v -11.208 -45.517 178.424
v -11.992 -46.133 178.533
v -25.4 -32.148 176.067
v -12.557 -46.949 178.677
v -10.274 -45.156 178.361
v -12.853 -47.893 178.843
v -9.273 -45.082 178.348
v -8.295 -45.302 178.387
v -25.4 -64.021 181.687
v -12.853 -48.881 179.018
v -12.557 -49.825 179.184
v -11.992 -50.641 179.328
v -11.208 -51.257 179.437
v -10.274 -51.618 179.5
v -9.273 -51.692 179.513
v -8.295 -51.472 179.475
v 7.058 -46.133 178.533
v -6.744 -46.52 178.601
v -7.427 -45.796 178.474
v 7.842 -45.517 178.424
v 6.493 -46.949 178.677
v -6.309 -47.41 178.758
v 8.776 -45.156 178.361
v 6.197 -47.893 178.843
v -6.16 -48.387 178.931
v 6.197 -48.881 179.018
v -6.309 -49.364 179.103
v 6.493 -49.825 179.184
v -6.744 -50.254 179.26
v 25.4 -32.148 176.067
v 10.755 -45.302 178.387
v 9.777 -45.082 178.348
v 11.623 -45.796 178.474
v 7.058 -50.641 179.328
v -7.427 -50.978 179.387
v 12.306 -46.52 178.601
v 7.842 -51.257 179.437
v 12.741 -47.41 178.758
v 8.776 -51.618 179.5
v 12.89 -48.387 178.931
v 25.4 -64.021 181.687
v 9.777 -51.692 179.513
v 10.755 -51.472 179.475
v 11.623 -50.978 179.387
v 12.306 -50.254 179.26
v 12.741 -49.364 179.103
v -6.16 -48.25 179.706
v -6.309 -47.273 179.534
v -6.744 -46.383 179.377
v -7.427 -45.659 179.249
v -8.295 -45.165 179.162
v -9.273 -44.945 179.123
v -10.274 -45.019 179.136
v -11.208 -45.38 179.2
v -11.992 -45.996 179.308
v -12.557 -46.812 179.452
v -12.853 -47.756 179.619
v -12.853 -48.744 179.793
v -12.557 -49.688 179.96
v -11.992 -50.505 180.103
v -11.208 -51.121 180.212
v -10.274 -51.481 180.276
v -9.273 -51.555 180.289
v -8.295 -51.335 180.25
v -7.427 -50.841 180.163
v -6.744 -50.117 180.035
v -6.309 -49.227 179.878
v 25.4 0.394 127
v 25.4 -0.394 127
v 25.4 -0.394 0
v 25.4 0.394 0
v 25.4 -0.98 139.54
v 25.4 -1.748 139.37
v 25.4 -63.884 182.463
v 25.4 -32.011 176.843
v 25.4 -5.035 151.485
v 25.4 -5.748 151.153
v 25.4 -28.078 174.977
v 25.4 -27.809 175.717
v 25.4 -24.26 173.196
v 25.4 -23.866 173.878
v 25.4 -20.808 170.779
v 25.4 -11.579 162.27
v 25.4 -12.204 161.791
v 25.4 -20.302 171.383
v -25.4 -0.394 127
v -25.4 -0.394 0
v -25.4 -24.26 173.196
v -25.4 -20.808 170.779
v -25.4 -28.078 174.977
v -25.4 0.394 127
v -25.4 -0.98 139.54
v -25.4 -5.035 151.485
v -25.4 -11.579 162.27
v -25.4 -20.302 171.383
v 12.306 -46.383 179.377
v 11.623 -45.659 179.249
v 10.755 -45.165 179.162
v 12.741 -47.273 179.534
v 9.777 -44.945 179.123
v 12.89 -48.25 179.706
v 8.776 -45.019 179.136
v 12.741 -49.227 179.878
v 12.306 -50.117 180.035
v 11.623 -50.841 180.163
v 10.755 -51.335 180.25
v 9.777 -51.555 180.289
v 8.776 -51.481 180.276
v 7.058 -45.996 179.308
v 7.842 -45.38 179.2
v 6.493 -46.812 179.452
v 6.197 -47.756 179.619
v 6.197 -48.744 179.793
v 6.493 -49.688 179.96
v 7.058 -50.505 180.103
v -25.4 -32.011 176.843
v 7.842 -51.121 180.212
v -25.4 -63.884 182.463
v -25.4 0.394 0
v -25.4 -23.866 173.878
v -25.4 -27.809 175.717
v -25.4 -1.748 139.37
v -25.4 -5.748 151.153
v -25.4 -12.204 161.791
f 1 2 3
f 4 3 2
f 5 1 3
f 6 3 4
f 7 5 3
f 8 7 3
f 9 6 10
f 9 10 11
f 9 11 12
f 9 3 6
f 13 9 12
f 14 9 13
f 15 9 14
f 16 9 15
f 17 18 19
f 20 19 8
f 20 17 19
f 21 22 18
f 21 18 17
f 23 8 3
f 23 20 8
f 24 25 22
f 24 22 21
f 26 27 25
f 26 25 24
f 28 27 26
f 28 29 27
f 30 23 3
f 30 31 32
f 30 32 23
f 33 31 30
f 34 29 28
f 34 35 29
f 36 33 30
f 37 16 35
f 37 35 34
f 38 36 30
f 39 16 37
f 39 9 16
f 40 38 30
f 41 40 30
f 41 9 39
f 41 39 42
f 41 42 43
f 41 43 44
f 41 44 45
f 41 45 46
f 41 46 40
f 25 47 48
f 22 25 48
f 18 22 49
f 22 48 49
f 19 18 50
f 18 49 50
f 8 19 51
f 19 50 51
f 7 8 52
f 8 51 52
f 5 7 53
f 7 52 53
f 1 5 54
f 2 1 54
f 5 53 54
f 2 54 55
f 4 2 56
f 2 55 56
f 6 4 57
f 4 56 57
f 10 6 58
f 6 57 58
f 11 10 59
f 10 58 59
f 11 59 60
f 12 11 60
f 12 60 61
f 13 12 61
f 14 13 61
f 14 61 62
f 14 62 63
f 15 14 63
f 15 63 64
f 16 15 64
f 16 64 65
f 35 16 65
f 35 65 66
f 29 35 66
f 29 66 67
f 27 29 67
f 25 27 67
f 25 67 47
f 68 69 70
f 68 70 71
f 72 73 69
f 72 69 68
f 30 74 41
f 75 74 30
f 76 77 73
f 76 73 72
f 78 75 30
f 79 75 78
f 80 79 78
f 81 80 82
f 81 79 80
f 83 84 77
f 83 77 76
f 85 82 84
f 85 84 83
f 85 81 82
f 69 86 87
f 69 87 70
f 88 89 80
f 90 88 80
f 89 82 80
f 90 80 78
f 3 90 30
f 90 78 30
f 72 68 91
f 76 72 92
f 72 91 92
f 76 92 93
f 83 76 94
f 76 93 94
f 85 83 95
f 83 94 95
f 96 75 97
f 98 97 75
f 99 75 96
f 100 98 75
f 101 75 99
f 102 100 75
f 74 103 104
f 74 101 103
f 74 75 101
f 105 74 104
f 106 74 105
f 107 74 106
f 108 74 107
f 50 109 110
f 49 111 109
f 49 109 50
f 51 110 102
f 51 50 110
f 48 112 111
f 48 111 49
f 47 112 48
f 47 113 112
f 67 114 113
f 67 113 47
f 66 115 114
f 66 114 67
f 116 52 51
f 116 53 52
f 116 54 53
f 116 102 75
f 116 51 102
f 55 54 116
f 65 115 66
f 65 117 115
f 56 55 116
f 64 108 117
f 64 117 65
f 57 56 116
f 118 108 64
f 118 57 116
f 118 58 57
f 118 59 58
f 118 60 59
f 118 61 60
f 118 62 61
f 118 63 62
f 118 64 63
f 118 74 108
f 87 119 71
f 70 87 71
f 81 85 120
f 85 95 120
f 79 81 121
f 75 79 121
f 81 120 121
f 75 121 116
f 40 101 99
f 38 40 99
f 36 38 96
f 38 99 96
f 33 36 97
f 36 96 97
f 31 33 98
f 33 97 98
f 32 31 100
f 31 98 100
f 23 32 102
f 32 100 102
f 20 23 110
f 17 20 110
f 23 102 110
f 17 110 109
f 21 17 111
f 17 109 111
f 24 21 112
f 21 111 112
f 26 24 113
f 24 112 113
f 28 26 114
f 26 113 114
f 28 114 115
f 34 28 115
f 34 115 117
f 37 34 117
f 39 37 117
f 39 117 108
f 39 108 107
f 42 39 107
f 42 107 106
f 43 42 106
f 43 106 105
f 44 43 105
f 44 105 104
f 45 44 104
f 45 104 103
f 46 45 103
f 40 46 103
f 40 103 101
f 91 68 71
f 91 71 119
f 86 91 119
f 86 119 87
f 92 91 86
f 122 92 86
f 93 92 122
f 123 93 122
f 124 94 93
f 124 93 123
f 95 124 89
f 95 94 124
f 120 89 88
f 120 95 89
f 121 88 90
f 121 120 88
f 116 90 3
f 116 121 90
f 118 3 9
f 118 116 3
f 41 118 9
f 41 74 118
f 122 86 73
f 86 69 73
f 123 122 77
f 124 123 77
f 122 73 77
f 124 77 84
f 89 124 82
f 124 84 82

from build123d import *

# Parameters (mm, degrees)
F0_W     = 50.8
F0_H     = 0.7874
F3_R     = 3.3655
F4_DEPTH = 25.4


with BuildPart() as f2:
    # F2: sweep along a path in F1
    with BuildLine(Plane.YZ) as f2_path:
        Line((0, 0), (0, 127))
        ThreePointArc((0, 127), (-5.3913965951, 151.3190184681), (-20.5553226245, 171.0810316215))
        ThreePointArc((-20.5553226245, 171.0810316215), (-25.9637465294, 174.5265776491), (-32.0796557913, 176.4549164323))
        Line((-32.0796557913, 176.4549164323), (-63.9523993907, 182.0749410781))
    # F0 (on Top) → F2 (sweep)
    with BuildSketch(Plane.XY):
        Rectangle(F0_W, F0_H)
    sweep(path=f2_path.line)

    # F3 (on face) → F4 (cut)
    with BuildSketch(Plane(origin=(0, 29.2766132085, 166.0359242292), x_dir=(1, 0, 0), z_dir=(0, 0.1736481777, 0.984807753))):
        with Locations((-9.525, -78.7228004607)):
            Circle(F3_R)
        with Locations((9.525, -78.7228004607)):
            Circle(F3_R)
    extrude(amount=-F4_DEPTH, mode=Mode.SUBTRACT)


solid = f2.part
